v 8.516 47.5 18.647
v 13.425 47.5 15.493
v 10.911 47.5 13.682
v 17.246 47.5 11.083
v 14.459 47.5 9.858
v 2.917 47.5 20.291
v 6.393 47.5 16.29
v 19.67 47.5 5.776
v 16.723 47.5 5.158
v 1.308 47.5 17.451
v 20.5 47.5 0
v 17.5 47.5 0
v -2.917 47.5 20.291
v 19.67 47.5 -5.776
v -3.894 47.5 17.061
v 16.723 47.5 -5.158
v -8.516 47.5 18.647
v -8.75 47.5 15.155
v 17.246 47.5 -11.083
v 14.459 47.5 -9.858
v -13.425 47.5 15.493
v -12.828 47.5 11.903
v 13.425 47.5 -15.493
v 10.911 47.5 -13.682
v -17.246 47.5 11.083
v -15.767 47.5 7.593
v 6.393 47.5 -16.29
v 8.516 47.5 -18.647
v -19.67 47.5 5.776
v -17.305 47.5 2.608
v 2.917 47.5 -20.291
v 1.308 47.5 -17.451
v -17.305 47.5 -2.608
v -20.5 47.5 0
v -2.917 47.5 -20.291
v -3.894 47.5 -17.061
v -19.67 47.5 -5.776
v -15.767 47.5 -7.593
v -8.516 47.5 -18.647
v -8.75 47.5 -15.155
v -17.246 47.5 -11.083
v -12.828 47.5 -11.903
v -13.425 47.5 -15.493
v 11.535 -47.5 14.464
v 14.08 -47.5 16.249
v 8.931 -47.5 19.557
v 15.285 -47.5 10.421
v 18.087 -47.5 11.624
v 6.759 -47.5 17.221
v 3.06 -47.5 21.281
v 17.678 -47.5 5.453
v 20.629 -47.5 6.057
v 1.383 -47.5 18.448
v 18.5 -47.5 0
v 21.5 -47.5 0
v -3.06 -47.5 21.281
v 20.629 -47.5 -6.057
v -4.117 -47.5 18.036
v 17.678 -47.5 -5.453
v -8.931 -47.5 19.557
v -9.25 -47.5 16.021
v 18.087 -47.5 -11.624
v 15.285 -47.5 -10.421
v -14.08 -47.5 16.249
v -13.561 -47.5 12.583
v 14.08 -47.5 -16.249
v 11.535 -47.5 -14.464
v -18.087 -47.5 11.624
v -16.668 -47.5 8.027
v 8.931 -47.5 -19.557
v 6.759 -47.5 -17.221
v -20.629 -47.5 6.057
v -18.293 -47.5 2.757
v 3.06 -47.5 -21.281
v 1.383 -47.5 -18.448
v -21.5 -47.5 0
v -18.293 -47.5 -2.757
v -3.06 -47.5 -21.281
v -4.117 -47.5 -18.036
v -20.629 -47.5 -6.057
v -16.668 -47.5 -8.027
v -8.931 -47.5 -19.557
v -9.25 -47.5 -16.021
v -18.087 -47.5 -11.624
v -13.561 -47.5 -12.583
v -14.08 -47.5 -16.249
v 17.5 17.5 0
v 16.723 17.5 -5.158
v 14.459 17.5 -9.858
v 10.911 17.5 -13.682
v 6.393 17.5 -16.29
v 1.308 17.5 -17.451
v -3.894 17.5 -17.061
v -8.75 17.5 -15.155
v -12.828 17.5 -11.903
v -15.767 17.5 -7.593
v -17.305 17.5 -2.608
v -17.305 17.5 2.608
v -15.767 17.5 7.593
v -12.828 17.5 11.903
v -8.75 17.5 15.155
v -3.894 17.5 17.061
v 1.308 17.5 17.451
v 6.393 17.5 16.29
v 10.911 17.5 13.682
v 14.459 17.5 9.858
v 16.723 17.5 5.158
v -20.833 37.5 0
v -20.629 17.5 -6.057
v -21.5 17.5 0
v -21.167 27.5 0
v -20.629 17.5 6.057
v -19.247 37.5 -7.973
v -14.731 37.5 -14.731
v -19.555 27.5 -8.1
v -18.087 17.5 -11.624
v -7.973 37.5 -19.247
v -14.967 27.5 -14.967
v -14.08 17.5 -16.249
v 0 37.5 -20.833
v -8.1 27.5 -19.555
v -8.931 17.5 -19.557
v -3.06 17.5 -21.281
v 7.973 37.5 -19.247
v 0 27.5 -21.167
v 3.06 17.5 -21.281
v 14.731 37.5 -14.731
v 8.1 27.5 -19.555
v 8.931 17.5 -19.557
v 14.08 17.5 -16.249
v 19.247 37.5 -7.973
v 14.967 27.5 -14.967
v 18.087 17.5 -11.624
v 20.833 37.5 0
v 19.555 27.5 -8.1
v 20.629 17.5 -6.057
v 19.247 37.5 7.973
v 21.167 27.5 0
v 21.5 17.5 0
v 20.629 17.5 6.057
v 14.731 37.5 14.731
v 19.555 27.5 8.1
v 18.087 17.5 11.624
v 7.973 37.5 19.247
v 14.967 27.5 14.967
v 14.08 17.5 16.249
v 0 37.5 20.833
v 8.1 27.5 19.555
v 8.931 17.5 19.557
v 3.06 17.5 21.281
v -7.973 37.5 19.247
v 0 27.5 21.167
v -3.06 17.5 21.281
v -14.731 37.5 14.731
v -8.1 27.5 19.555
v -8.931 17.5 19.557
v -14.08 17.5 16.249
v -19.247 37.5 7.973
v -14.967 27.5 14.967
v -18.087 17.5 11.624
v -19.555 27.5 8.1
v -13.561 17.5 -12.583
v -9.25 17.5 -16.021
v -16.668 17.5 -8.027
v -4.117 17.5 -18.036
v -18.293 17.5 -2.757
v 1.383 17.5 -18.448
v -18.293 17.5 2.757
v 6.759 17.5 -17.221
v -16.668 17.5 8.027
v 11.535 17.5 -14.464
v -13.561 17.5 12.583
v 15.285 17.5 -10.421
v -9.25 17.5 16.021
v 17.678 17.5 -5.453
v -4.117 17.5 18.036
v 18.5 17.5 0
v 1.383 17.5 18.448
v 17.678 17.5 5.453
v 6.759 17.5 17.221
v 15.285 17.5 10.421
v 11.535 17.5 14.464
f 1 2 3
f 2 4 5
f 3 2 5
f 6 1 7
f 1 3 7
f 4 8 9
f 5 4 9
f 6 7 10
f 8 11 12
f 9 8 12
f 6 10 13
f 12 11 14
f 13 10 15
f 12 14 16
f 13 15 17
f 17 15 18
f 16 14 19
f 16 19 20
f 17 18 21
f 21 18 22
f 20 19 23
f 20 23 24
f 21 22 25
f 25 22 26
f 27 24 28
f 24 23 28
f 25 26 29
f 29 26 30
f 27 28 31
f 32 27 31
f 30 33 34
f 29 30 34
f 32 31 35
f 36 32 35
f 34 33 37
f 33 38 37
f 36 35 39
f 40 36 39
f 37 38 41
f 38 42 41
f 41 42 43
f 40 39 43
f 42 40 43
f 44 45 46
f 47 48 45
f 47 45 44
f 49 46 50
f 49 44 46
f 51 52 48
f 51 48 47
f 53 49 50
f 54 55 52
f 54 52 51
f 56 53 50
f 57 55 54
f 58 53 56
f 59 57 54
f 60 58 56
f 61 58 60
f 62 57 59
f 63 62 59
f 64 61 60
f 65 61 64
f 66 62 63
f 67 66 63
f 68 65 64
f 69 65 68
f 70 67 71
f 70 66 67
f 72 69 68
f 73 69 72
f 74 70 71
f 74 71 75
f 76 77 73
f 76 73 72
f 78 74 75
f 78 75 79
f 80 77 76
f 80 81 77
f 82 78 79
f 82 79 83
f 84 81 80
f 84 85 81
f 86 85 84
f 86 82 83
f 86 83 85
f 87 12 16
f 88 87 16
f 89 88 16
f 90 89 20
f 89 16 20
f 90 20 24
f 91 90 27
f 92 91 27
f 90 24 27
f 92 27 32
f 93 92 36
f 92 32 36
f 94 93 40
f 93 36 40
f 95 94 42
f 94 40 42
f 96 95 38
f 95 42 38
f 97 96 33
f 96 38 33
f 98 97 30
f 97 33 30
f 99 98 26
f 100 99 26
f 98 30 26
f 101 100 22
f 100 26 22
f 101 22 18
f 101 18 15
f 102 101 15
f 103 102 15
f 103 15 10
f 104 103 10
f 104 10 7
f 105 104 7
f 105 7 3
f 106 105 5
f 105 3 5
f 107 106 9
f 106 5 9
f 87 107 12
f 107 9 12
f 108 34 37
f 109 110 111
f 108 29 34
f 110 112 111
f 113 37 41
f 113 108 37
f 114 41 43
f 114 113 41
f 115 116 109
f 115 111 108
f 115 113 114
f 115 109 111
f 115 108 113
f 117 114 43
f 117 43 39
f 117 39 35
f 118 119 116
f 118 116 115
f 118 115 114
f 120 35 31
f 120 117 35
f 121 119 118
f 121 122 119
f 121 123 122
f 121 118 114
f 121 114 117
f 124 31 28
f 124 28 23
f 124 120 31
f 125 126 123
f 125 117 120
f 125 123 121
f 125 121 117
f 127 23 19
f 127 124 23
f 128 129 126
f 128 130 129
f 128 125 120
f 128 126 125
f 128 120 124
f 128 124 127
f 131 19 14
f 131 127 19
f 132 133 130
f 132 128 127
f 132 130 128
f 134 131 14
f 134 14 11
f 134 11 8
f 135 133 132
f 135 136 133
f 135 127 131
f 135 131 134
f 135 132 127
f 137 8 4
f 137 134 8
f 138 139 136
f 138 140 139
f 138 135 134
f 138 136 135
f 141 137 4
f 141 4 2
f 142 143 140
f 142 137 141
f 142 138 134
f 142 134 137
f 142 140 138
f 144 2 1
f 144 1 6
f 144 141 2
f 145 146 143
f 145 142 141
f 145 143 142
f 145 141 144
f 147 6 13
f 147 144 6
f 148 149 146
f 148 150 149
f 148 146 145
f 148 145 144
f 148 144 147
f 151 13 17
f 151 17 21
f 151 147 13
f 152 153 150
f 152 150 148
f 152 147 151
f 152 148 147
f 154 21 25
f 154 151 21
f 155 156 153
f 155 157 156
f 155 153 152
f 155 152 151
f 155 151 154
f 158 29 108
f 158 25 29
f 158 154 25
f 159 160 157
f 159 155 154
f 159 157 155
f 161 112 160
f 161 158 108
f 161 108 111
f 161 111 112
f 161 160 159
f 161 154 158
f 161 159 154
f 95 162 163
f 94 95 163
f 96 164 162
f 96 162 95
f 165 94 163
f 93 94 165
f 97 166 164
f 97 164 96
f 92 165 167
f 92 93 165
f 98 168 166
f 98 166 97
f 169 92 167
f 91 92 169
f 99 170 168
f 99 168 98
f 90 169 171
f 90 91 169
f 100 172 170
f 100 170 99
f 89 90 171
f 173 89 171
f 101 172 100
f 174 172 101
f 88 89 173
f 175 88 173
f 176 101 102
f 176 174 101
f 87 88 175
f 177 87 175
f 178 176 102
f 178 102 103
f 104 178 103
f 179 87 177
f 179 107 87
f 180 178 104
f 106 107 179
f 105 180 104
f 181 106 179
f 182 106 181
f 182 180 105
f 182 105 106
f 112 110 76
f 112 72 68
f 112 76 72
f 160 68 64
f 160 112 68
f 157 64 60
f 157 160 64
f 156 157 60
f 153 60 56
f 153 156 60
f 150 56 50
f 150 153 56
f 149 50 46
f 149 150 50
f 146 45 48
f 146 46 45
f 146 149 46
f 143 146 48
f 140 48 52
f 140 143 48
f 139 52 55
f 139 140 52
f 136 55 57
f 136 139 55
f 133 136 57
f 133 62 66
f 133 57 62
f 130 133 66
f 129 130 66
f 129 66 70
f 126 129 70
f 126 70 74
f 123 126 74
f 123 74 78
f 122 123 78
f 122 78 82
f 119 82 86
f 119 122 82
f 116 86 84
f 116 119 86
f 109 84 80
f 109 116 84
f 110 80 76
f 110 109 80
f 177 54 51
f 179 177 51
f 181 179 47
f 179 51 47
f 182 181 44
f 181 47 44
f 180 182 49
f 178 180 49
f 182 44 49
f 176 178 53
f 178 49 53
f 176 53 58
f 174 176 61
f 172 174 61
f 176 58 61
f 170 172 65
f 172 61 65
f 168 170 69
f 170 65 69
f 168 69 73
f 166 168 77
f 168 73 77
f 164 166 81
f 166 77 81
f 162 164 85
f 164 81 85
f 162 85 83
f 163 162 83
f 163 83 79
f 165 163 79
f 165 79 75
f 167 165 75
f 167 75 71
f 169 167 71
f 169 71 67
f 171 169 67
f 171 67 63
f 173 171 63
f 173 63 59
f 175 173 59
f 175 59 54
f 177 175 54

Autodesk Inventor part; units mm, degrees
ref_plane "YZ Plane" through (0, 0, 0) normal (1, 0, 0) x (0, 1, 0)
ref_plane "XZ Plane" through (0, 0, 0) normal (0, 1, 0) x (-1, 0, 0)
ref_plane "XY Plane" through (0, 0, 0) normal (0, 0, 1) x (1, 0, 0)
sketch "Boceto1" plane through (0, 0, 0) normal (0, 0, 1) x (1, 0, 0)
  line L0 (0, 132.9544) -> (0, -187.2356) construction
  line L1 (-210.4029, 0) -> (220.8608, 0) construction
  line L2 (0, 47.5) -> (-20.5, 47.5)
  line L3 (0, -47.5) -> (-21.5, -47.5)
  line L4 (-21.5, -47.5) -> (-21.5, 65.7423) construction
  line L5 (-20.5, 47.5) -> (-21.5, 17.5)
  line L6 (-21.5, -47.5) -> (-21.5, 17.5)
  line L7 (0, 47.5) -> (0, -47.5)
  point P0 (0, 0)
  point P1 (-10.75, -47.5)
  point P2 (-10.25, 47.5)
  dimension "d0" = 20.5
  dimension "d1" = 21.5
  dimension "d2" = 95
  dimension "d3" = 30
revolve "Revolución1" add sketch "Boceto1" angle 360 about axis through (0, 132.9544, 0) along (0, -1, 0)
sketch "Boceto2" plane through (0, 47.5, 0) normal (0, 1, 0) x (1, 0, 0)
  circle A0 centre (0, 0) radius 17.5
  dimension "d5" = 35
extrude "Extrusión1" cut sketch "Boceto2" against normal blind 150
sketch "Boceto3" plane through (0, -47.5, 0) normal (0, -1, 0) x (1, 0, 0)
  circle A0 centre (0, 0) radius 18.5
  dimension "d8" = 37
extrude "Extrusión2" cut sketch "Boceto3" against normal blind 65
